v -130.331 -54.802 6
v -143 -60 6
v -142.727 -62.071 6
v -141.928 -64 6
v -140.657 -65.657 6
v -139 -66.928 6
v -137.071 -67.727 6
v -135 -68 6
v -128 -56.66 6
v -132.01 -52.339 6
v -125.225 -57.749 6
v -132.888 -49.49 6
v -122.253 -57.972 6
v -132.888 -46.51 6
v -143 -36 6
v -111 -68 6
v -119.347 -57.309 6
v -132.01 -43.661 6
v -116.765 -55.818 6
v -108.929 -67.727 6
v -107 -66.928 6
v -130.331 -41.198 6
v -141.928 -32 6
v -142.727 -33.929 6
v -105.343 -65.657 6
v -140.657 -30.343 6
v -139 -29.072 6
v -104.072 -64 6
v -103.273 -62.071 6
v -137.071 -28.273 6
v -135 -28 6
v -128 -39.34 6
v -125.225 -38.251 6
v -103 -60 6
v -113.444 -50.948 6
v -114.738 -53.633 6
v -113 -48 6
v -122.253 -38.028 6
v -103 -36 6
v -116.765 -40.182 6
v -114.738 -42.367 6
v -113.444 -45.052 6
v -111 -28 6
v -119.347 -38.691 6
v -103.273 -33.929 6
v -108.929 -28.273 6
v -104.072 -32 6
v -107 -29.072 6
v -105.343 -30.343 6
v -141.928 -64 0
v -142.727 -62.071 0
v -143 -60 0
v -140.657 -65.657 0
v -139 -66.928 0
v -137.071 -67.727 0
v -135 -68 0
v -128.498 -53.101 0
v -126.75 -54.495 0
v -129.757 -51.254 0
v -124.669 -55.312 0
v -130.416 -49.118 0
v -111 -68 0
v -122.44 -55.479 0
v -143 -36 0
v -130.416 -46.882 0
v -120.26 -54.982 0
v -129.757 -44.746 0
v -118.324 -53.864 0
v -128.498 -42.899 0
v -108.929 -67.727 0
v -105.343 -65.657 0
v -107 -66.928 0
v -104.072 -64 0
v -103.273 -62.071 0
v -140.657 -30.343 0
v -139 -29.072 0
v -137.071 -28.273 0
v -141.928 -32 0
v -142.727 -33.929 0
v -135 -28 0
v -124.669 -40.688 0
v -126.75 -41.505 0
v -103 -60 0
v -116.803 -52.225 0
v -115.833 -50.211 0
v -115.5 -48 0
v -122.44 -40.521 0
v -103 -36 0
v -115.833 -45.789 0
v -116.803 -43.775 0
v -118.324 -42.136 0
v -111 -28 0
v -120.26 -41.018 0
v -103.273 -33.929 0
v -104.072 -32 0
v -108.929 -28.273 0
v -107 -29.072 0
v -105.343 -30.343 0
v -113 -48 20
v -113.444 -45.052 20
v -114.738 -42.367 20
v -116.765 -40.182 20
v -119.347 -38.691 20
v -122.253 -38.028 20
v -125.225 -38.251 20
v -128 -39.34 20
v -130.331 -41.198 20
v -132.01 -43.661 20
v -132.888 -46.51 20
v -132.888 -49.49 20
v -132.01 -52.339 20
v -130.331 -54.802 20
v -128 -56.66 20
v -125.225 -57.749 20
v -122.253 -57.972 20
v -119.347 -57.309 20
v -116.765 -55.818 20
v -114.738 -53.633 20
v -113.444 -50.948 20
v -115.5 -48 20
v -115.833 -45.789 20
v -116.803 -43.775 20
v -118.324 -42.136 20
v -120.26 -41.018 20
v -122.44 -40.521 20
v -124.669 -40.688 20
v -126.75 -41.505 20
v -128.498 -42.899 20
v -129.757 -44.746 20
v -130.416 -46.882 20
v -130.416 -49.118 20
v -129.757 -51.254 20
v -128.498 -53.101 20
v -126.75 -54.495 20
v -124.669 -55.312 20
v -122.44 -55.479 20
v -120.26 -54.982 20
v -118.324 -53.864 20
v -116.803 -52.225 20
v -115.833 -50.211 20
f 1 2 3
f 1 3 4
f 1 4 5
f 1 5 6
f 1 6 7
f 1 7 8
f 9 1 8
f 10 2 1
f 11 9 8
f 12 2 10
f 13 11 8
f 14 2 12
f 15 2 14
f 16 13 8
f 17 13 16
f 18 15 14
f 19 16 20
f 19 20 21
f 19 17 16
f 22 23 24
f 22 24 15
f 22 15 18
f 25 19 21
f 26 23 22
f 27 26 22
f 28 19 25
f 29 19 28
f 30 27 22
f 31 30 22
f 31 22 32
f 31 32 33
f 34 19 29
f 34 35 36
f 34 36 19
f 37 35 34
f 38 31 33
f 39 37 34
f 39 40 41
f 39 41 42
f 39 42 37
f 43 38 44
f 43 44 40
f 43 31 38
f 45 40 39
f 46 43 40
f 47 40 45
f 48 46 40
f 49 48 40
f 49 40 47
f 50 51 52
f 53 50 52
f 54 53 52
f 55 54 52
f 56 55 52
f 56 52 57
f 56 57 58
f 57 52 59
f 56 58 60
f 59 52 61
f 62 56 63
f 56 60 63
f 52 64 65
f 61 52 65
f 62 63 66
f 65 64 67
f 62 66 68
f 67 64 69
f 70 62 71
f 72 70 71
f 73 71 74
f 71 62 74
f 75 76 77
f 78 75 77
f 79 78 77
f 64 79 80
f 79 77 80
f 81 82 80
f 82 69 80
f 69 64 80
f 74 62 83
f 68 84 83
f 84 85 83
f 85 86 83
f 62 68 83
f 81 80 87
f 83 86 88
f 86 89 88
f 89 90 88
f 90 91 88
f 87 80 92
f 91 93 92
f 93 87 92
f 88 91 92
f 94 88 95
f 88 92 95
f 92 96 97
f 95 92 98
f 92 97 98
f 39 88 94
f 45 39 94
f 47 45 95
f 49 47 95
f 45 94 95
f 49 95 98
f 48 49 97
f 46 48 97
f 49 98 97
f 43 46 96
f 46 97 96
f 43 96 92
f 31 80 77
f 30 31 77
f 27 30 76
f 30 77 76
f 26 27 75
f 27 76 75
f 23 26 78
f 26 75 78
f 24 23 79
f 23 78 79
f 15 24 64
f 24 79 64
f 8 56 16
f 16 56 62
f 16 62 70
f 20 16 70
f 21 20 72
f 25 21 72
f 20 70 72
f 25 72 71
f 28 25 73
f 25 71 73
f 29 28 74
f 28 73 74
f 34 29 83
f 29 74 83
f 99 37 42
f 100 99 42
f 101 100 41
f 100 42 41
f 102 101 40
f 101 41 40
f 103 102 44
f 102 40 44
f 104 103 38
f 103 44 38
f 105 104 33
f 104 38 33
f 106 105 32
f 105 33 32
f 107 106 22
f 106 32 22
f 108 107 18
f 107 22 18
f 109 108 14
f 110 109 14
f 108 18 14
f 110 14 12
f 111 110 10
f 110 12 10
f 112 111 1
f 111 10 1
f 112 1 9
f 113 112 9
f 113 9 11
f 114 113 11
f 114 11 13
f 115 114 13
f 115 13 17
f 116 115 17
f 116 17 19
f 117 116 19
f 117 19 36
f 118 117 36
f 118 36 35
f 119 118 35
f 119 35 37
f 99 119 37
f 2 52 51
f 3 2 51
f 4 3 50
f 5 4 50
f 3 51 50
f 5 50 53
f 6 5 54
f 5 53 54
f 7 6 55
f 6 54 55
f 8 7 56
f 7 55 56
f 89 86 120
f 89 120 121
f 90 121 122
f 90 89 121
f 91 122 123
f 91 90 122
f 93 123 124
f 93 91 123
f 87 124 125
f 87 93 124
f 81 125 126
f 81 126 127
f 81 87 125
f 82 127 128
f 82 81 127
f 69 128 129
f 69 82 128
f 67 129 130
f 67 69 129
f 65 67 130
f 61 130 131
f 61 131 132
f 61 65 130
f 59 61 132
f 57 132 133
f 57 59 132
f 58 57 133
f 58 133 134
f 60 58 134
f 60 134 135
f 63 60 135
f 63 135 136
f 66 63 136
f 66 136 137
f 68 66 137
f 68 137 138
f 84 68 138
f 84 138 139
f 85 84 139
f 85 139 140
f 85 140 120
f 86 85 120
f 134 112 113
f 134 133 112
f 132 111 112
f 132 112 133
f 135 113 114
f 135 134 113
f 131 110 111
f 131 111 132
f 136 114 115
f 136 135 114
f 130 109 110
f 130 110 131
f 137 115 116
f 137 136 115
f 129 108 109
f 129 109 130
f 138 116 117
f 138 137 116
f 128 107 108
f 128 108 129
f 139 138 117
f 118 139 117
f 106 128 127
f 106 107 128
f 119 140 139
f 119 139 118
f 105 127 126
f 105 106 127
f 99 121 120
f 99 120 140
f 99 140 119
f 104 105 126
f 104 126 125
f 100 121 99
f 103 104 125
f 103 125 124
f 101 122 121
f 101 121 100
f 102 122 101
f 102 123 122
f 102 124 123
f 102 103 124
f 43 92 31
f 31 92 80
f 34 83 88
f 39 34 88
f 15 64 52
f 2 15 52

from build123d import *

# Parameters (mm, degrees)
SKETCH1_R           = 10
SKETCH1_R_2         = 7.5
BOSS_EXTRUDE1_DEPTH = 20
SKETCH2_R           = 7.5
BOSS_EXTRUDE2_DEPTH = 6


with BuildPart() as part:
    # Sketch1 → Boss-Extrude1 (new body)
    with BuildSketch(Plane.XY):
        with Locations((-123, -48)):
            Circle(SKETCH1_R)
        with Locations((-123, -48)):
            Circle(SKETCH1_R_2, mode=Mode.SUBTRACT)
    extrude(amount=BOSS_EXTRUDE1_DEPTH)

    # Sketch2 → Boss-Extrude2 (add)
    with BuildSketch(Plane(origin=(0, 0, 0), x_dir=(-1, 0, 0), z_dir=(0, 0, -1))):
        with BuildLine():
            Line((111, -28), (135, -28))
            ThreePointArc((135, -28), (140.656854249, -30.343145751), (143, -36))
            Line((143, -36), (143, -60))
            ThreePointArc((143, -60), (140.656854249, -65.656854249), (135, -68))
            Line((135, -68), (111, -68))
            ThreePointArc((111, -68), (105.343145751, -65.656854249), (103, -60))
            Line((103, -60), (103, -36))
            ThreePointArc((103, -36), (105.343145751, -30.343145751), (111, -28))
        make_face()
        with Locations(Location((123, -48, 0), (0, 0, 180))):
            Circle(SKETCH2_R, mode=Mode.SUBTRACT)
    extrude(amount=-BOSS_EXTRUDE2_DEPTH)


solid = part.part
